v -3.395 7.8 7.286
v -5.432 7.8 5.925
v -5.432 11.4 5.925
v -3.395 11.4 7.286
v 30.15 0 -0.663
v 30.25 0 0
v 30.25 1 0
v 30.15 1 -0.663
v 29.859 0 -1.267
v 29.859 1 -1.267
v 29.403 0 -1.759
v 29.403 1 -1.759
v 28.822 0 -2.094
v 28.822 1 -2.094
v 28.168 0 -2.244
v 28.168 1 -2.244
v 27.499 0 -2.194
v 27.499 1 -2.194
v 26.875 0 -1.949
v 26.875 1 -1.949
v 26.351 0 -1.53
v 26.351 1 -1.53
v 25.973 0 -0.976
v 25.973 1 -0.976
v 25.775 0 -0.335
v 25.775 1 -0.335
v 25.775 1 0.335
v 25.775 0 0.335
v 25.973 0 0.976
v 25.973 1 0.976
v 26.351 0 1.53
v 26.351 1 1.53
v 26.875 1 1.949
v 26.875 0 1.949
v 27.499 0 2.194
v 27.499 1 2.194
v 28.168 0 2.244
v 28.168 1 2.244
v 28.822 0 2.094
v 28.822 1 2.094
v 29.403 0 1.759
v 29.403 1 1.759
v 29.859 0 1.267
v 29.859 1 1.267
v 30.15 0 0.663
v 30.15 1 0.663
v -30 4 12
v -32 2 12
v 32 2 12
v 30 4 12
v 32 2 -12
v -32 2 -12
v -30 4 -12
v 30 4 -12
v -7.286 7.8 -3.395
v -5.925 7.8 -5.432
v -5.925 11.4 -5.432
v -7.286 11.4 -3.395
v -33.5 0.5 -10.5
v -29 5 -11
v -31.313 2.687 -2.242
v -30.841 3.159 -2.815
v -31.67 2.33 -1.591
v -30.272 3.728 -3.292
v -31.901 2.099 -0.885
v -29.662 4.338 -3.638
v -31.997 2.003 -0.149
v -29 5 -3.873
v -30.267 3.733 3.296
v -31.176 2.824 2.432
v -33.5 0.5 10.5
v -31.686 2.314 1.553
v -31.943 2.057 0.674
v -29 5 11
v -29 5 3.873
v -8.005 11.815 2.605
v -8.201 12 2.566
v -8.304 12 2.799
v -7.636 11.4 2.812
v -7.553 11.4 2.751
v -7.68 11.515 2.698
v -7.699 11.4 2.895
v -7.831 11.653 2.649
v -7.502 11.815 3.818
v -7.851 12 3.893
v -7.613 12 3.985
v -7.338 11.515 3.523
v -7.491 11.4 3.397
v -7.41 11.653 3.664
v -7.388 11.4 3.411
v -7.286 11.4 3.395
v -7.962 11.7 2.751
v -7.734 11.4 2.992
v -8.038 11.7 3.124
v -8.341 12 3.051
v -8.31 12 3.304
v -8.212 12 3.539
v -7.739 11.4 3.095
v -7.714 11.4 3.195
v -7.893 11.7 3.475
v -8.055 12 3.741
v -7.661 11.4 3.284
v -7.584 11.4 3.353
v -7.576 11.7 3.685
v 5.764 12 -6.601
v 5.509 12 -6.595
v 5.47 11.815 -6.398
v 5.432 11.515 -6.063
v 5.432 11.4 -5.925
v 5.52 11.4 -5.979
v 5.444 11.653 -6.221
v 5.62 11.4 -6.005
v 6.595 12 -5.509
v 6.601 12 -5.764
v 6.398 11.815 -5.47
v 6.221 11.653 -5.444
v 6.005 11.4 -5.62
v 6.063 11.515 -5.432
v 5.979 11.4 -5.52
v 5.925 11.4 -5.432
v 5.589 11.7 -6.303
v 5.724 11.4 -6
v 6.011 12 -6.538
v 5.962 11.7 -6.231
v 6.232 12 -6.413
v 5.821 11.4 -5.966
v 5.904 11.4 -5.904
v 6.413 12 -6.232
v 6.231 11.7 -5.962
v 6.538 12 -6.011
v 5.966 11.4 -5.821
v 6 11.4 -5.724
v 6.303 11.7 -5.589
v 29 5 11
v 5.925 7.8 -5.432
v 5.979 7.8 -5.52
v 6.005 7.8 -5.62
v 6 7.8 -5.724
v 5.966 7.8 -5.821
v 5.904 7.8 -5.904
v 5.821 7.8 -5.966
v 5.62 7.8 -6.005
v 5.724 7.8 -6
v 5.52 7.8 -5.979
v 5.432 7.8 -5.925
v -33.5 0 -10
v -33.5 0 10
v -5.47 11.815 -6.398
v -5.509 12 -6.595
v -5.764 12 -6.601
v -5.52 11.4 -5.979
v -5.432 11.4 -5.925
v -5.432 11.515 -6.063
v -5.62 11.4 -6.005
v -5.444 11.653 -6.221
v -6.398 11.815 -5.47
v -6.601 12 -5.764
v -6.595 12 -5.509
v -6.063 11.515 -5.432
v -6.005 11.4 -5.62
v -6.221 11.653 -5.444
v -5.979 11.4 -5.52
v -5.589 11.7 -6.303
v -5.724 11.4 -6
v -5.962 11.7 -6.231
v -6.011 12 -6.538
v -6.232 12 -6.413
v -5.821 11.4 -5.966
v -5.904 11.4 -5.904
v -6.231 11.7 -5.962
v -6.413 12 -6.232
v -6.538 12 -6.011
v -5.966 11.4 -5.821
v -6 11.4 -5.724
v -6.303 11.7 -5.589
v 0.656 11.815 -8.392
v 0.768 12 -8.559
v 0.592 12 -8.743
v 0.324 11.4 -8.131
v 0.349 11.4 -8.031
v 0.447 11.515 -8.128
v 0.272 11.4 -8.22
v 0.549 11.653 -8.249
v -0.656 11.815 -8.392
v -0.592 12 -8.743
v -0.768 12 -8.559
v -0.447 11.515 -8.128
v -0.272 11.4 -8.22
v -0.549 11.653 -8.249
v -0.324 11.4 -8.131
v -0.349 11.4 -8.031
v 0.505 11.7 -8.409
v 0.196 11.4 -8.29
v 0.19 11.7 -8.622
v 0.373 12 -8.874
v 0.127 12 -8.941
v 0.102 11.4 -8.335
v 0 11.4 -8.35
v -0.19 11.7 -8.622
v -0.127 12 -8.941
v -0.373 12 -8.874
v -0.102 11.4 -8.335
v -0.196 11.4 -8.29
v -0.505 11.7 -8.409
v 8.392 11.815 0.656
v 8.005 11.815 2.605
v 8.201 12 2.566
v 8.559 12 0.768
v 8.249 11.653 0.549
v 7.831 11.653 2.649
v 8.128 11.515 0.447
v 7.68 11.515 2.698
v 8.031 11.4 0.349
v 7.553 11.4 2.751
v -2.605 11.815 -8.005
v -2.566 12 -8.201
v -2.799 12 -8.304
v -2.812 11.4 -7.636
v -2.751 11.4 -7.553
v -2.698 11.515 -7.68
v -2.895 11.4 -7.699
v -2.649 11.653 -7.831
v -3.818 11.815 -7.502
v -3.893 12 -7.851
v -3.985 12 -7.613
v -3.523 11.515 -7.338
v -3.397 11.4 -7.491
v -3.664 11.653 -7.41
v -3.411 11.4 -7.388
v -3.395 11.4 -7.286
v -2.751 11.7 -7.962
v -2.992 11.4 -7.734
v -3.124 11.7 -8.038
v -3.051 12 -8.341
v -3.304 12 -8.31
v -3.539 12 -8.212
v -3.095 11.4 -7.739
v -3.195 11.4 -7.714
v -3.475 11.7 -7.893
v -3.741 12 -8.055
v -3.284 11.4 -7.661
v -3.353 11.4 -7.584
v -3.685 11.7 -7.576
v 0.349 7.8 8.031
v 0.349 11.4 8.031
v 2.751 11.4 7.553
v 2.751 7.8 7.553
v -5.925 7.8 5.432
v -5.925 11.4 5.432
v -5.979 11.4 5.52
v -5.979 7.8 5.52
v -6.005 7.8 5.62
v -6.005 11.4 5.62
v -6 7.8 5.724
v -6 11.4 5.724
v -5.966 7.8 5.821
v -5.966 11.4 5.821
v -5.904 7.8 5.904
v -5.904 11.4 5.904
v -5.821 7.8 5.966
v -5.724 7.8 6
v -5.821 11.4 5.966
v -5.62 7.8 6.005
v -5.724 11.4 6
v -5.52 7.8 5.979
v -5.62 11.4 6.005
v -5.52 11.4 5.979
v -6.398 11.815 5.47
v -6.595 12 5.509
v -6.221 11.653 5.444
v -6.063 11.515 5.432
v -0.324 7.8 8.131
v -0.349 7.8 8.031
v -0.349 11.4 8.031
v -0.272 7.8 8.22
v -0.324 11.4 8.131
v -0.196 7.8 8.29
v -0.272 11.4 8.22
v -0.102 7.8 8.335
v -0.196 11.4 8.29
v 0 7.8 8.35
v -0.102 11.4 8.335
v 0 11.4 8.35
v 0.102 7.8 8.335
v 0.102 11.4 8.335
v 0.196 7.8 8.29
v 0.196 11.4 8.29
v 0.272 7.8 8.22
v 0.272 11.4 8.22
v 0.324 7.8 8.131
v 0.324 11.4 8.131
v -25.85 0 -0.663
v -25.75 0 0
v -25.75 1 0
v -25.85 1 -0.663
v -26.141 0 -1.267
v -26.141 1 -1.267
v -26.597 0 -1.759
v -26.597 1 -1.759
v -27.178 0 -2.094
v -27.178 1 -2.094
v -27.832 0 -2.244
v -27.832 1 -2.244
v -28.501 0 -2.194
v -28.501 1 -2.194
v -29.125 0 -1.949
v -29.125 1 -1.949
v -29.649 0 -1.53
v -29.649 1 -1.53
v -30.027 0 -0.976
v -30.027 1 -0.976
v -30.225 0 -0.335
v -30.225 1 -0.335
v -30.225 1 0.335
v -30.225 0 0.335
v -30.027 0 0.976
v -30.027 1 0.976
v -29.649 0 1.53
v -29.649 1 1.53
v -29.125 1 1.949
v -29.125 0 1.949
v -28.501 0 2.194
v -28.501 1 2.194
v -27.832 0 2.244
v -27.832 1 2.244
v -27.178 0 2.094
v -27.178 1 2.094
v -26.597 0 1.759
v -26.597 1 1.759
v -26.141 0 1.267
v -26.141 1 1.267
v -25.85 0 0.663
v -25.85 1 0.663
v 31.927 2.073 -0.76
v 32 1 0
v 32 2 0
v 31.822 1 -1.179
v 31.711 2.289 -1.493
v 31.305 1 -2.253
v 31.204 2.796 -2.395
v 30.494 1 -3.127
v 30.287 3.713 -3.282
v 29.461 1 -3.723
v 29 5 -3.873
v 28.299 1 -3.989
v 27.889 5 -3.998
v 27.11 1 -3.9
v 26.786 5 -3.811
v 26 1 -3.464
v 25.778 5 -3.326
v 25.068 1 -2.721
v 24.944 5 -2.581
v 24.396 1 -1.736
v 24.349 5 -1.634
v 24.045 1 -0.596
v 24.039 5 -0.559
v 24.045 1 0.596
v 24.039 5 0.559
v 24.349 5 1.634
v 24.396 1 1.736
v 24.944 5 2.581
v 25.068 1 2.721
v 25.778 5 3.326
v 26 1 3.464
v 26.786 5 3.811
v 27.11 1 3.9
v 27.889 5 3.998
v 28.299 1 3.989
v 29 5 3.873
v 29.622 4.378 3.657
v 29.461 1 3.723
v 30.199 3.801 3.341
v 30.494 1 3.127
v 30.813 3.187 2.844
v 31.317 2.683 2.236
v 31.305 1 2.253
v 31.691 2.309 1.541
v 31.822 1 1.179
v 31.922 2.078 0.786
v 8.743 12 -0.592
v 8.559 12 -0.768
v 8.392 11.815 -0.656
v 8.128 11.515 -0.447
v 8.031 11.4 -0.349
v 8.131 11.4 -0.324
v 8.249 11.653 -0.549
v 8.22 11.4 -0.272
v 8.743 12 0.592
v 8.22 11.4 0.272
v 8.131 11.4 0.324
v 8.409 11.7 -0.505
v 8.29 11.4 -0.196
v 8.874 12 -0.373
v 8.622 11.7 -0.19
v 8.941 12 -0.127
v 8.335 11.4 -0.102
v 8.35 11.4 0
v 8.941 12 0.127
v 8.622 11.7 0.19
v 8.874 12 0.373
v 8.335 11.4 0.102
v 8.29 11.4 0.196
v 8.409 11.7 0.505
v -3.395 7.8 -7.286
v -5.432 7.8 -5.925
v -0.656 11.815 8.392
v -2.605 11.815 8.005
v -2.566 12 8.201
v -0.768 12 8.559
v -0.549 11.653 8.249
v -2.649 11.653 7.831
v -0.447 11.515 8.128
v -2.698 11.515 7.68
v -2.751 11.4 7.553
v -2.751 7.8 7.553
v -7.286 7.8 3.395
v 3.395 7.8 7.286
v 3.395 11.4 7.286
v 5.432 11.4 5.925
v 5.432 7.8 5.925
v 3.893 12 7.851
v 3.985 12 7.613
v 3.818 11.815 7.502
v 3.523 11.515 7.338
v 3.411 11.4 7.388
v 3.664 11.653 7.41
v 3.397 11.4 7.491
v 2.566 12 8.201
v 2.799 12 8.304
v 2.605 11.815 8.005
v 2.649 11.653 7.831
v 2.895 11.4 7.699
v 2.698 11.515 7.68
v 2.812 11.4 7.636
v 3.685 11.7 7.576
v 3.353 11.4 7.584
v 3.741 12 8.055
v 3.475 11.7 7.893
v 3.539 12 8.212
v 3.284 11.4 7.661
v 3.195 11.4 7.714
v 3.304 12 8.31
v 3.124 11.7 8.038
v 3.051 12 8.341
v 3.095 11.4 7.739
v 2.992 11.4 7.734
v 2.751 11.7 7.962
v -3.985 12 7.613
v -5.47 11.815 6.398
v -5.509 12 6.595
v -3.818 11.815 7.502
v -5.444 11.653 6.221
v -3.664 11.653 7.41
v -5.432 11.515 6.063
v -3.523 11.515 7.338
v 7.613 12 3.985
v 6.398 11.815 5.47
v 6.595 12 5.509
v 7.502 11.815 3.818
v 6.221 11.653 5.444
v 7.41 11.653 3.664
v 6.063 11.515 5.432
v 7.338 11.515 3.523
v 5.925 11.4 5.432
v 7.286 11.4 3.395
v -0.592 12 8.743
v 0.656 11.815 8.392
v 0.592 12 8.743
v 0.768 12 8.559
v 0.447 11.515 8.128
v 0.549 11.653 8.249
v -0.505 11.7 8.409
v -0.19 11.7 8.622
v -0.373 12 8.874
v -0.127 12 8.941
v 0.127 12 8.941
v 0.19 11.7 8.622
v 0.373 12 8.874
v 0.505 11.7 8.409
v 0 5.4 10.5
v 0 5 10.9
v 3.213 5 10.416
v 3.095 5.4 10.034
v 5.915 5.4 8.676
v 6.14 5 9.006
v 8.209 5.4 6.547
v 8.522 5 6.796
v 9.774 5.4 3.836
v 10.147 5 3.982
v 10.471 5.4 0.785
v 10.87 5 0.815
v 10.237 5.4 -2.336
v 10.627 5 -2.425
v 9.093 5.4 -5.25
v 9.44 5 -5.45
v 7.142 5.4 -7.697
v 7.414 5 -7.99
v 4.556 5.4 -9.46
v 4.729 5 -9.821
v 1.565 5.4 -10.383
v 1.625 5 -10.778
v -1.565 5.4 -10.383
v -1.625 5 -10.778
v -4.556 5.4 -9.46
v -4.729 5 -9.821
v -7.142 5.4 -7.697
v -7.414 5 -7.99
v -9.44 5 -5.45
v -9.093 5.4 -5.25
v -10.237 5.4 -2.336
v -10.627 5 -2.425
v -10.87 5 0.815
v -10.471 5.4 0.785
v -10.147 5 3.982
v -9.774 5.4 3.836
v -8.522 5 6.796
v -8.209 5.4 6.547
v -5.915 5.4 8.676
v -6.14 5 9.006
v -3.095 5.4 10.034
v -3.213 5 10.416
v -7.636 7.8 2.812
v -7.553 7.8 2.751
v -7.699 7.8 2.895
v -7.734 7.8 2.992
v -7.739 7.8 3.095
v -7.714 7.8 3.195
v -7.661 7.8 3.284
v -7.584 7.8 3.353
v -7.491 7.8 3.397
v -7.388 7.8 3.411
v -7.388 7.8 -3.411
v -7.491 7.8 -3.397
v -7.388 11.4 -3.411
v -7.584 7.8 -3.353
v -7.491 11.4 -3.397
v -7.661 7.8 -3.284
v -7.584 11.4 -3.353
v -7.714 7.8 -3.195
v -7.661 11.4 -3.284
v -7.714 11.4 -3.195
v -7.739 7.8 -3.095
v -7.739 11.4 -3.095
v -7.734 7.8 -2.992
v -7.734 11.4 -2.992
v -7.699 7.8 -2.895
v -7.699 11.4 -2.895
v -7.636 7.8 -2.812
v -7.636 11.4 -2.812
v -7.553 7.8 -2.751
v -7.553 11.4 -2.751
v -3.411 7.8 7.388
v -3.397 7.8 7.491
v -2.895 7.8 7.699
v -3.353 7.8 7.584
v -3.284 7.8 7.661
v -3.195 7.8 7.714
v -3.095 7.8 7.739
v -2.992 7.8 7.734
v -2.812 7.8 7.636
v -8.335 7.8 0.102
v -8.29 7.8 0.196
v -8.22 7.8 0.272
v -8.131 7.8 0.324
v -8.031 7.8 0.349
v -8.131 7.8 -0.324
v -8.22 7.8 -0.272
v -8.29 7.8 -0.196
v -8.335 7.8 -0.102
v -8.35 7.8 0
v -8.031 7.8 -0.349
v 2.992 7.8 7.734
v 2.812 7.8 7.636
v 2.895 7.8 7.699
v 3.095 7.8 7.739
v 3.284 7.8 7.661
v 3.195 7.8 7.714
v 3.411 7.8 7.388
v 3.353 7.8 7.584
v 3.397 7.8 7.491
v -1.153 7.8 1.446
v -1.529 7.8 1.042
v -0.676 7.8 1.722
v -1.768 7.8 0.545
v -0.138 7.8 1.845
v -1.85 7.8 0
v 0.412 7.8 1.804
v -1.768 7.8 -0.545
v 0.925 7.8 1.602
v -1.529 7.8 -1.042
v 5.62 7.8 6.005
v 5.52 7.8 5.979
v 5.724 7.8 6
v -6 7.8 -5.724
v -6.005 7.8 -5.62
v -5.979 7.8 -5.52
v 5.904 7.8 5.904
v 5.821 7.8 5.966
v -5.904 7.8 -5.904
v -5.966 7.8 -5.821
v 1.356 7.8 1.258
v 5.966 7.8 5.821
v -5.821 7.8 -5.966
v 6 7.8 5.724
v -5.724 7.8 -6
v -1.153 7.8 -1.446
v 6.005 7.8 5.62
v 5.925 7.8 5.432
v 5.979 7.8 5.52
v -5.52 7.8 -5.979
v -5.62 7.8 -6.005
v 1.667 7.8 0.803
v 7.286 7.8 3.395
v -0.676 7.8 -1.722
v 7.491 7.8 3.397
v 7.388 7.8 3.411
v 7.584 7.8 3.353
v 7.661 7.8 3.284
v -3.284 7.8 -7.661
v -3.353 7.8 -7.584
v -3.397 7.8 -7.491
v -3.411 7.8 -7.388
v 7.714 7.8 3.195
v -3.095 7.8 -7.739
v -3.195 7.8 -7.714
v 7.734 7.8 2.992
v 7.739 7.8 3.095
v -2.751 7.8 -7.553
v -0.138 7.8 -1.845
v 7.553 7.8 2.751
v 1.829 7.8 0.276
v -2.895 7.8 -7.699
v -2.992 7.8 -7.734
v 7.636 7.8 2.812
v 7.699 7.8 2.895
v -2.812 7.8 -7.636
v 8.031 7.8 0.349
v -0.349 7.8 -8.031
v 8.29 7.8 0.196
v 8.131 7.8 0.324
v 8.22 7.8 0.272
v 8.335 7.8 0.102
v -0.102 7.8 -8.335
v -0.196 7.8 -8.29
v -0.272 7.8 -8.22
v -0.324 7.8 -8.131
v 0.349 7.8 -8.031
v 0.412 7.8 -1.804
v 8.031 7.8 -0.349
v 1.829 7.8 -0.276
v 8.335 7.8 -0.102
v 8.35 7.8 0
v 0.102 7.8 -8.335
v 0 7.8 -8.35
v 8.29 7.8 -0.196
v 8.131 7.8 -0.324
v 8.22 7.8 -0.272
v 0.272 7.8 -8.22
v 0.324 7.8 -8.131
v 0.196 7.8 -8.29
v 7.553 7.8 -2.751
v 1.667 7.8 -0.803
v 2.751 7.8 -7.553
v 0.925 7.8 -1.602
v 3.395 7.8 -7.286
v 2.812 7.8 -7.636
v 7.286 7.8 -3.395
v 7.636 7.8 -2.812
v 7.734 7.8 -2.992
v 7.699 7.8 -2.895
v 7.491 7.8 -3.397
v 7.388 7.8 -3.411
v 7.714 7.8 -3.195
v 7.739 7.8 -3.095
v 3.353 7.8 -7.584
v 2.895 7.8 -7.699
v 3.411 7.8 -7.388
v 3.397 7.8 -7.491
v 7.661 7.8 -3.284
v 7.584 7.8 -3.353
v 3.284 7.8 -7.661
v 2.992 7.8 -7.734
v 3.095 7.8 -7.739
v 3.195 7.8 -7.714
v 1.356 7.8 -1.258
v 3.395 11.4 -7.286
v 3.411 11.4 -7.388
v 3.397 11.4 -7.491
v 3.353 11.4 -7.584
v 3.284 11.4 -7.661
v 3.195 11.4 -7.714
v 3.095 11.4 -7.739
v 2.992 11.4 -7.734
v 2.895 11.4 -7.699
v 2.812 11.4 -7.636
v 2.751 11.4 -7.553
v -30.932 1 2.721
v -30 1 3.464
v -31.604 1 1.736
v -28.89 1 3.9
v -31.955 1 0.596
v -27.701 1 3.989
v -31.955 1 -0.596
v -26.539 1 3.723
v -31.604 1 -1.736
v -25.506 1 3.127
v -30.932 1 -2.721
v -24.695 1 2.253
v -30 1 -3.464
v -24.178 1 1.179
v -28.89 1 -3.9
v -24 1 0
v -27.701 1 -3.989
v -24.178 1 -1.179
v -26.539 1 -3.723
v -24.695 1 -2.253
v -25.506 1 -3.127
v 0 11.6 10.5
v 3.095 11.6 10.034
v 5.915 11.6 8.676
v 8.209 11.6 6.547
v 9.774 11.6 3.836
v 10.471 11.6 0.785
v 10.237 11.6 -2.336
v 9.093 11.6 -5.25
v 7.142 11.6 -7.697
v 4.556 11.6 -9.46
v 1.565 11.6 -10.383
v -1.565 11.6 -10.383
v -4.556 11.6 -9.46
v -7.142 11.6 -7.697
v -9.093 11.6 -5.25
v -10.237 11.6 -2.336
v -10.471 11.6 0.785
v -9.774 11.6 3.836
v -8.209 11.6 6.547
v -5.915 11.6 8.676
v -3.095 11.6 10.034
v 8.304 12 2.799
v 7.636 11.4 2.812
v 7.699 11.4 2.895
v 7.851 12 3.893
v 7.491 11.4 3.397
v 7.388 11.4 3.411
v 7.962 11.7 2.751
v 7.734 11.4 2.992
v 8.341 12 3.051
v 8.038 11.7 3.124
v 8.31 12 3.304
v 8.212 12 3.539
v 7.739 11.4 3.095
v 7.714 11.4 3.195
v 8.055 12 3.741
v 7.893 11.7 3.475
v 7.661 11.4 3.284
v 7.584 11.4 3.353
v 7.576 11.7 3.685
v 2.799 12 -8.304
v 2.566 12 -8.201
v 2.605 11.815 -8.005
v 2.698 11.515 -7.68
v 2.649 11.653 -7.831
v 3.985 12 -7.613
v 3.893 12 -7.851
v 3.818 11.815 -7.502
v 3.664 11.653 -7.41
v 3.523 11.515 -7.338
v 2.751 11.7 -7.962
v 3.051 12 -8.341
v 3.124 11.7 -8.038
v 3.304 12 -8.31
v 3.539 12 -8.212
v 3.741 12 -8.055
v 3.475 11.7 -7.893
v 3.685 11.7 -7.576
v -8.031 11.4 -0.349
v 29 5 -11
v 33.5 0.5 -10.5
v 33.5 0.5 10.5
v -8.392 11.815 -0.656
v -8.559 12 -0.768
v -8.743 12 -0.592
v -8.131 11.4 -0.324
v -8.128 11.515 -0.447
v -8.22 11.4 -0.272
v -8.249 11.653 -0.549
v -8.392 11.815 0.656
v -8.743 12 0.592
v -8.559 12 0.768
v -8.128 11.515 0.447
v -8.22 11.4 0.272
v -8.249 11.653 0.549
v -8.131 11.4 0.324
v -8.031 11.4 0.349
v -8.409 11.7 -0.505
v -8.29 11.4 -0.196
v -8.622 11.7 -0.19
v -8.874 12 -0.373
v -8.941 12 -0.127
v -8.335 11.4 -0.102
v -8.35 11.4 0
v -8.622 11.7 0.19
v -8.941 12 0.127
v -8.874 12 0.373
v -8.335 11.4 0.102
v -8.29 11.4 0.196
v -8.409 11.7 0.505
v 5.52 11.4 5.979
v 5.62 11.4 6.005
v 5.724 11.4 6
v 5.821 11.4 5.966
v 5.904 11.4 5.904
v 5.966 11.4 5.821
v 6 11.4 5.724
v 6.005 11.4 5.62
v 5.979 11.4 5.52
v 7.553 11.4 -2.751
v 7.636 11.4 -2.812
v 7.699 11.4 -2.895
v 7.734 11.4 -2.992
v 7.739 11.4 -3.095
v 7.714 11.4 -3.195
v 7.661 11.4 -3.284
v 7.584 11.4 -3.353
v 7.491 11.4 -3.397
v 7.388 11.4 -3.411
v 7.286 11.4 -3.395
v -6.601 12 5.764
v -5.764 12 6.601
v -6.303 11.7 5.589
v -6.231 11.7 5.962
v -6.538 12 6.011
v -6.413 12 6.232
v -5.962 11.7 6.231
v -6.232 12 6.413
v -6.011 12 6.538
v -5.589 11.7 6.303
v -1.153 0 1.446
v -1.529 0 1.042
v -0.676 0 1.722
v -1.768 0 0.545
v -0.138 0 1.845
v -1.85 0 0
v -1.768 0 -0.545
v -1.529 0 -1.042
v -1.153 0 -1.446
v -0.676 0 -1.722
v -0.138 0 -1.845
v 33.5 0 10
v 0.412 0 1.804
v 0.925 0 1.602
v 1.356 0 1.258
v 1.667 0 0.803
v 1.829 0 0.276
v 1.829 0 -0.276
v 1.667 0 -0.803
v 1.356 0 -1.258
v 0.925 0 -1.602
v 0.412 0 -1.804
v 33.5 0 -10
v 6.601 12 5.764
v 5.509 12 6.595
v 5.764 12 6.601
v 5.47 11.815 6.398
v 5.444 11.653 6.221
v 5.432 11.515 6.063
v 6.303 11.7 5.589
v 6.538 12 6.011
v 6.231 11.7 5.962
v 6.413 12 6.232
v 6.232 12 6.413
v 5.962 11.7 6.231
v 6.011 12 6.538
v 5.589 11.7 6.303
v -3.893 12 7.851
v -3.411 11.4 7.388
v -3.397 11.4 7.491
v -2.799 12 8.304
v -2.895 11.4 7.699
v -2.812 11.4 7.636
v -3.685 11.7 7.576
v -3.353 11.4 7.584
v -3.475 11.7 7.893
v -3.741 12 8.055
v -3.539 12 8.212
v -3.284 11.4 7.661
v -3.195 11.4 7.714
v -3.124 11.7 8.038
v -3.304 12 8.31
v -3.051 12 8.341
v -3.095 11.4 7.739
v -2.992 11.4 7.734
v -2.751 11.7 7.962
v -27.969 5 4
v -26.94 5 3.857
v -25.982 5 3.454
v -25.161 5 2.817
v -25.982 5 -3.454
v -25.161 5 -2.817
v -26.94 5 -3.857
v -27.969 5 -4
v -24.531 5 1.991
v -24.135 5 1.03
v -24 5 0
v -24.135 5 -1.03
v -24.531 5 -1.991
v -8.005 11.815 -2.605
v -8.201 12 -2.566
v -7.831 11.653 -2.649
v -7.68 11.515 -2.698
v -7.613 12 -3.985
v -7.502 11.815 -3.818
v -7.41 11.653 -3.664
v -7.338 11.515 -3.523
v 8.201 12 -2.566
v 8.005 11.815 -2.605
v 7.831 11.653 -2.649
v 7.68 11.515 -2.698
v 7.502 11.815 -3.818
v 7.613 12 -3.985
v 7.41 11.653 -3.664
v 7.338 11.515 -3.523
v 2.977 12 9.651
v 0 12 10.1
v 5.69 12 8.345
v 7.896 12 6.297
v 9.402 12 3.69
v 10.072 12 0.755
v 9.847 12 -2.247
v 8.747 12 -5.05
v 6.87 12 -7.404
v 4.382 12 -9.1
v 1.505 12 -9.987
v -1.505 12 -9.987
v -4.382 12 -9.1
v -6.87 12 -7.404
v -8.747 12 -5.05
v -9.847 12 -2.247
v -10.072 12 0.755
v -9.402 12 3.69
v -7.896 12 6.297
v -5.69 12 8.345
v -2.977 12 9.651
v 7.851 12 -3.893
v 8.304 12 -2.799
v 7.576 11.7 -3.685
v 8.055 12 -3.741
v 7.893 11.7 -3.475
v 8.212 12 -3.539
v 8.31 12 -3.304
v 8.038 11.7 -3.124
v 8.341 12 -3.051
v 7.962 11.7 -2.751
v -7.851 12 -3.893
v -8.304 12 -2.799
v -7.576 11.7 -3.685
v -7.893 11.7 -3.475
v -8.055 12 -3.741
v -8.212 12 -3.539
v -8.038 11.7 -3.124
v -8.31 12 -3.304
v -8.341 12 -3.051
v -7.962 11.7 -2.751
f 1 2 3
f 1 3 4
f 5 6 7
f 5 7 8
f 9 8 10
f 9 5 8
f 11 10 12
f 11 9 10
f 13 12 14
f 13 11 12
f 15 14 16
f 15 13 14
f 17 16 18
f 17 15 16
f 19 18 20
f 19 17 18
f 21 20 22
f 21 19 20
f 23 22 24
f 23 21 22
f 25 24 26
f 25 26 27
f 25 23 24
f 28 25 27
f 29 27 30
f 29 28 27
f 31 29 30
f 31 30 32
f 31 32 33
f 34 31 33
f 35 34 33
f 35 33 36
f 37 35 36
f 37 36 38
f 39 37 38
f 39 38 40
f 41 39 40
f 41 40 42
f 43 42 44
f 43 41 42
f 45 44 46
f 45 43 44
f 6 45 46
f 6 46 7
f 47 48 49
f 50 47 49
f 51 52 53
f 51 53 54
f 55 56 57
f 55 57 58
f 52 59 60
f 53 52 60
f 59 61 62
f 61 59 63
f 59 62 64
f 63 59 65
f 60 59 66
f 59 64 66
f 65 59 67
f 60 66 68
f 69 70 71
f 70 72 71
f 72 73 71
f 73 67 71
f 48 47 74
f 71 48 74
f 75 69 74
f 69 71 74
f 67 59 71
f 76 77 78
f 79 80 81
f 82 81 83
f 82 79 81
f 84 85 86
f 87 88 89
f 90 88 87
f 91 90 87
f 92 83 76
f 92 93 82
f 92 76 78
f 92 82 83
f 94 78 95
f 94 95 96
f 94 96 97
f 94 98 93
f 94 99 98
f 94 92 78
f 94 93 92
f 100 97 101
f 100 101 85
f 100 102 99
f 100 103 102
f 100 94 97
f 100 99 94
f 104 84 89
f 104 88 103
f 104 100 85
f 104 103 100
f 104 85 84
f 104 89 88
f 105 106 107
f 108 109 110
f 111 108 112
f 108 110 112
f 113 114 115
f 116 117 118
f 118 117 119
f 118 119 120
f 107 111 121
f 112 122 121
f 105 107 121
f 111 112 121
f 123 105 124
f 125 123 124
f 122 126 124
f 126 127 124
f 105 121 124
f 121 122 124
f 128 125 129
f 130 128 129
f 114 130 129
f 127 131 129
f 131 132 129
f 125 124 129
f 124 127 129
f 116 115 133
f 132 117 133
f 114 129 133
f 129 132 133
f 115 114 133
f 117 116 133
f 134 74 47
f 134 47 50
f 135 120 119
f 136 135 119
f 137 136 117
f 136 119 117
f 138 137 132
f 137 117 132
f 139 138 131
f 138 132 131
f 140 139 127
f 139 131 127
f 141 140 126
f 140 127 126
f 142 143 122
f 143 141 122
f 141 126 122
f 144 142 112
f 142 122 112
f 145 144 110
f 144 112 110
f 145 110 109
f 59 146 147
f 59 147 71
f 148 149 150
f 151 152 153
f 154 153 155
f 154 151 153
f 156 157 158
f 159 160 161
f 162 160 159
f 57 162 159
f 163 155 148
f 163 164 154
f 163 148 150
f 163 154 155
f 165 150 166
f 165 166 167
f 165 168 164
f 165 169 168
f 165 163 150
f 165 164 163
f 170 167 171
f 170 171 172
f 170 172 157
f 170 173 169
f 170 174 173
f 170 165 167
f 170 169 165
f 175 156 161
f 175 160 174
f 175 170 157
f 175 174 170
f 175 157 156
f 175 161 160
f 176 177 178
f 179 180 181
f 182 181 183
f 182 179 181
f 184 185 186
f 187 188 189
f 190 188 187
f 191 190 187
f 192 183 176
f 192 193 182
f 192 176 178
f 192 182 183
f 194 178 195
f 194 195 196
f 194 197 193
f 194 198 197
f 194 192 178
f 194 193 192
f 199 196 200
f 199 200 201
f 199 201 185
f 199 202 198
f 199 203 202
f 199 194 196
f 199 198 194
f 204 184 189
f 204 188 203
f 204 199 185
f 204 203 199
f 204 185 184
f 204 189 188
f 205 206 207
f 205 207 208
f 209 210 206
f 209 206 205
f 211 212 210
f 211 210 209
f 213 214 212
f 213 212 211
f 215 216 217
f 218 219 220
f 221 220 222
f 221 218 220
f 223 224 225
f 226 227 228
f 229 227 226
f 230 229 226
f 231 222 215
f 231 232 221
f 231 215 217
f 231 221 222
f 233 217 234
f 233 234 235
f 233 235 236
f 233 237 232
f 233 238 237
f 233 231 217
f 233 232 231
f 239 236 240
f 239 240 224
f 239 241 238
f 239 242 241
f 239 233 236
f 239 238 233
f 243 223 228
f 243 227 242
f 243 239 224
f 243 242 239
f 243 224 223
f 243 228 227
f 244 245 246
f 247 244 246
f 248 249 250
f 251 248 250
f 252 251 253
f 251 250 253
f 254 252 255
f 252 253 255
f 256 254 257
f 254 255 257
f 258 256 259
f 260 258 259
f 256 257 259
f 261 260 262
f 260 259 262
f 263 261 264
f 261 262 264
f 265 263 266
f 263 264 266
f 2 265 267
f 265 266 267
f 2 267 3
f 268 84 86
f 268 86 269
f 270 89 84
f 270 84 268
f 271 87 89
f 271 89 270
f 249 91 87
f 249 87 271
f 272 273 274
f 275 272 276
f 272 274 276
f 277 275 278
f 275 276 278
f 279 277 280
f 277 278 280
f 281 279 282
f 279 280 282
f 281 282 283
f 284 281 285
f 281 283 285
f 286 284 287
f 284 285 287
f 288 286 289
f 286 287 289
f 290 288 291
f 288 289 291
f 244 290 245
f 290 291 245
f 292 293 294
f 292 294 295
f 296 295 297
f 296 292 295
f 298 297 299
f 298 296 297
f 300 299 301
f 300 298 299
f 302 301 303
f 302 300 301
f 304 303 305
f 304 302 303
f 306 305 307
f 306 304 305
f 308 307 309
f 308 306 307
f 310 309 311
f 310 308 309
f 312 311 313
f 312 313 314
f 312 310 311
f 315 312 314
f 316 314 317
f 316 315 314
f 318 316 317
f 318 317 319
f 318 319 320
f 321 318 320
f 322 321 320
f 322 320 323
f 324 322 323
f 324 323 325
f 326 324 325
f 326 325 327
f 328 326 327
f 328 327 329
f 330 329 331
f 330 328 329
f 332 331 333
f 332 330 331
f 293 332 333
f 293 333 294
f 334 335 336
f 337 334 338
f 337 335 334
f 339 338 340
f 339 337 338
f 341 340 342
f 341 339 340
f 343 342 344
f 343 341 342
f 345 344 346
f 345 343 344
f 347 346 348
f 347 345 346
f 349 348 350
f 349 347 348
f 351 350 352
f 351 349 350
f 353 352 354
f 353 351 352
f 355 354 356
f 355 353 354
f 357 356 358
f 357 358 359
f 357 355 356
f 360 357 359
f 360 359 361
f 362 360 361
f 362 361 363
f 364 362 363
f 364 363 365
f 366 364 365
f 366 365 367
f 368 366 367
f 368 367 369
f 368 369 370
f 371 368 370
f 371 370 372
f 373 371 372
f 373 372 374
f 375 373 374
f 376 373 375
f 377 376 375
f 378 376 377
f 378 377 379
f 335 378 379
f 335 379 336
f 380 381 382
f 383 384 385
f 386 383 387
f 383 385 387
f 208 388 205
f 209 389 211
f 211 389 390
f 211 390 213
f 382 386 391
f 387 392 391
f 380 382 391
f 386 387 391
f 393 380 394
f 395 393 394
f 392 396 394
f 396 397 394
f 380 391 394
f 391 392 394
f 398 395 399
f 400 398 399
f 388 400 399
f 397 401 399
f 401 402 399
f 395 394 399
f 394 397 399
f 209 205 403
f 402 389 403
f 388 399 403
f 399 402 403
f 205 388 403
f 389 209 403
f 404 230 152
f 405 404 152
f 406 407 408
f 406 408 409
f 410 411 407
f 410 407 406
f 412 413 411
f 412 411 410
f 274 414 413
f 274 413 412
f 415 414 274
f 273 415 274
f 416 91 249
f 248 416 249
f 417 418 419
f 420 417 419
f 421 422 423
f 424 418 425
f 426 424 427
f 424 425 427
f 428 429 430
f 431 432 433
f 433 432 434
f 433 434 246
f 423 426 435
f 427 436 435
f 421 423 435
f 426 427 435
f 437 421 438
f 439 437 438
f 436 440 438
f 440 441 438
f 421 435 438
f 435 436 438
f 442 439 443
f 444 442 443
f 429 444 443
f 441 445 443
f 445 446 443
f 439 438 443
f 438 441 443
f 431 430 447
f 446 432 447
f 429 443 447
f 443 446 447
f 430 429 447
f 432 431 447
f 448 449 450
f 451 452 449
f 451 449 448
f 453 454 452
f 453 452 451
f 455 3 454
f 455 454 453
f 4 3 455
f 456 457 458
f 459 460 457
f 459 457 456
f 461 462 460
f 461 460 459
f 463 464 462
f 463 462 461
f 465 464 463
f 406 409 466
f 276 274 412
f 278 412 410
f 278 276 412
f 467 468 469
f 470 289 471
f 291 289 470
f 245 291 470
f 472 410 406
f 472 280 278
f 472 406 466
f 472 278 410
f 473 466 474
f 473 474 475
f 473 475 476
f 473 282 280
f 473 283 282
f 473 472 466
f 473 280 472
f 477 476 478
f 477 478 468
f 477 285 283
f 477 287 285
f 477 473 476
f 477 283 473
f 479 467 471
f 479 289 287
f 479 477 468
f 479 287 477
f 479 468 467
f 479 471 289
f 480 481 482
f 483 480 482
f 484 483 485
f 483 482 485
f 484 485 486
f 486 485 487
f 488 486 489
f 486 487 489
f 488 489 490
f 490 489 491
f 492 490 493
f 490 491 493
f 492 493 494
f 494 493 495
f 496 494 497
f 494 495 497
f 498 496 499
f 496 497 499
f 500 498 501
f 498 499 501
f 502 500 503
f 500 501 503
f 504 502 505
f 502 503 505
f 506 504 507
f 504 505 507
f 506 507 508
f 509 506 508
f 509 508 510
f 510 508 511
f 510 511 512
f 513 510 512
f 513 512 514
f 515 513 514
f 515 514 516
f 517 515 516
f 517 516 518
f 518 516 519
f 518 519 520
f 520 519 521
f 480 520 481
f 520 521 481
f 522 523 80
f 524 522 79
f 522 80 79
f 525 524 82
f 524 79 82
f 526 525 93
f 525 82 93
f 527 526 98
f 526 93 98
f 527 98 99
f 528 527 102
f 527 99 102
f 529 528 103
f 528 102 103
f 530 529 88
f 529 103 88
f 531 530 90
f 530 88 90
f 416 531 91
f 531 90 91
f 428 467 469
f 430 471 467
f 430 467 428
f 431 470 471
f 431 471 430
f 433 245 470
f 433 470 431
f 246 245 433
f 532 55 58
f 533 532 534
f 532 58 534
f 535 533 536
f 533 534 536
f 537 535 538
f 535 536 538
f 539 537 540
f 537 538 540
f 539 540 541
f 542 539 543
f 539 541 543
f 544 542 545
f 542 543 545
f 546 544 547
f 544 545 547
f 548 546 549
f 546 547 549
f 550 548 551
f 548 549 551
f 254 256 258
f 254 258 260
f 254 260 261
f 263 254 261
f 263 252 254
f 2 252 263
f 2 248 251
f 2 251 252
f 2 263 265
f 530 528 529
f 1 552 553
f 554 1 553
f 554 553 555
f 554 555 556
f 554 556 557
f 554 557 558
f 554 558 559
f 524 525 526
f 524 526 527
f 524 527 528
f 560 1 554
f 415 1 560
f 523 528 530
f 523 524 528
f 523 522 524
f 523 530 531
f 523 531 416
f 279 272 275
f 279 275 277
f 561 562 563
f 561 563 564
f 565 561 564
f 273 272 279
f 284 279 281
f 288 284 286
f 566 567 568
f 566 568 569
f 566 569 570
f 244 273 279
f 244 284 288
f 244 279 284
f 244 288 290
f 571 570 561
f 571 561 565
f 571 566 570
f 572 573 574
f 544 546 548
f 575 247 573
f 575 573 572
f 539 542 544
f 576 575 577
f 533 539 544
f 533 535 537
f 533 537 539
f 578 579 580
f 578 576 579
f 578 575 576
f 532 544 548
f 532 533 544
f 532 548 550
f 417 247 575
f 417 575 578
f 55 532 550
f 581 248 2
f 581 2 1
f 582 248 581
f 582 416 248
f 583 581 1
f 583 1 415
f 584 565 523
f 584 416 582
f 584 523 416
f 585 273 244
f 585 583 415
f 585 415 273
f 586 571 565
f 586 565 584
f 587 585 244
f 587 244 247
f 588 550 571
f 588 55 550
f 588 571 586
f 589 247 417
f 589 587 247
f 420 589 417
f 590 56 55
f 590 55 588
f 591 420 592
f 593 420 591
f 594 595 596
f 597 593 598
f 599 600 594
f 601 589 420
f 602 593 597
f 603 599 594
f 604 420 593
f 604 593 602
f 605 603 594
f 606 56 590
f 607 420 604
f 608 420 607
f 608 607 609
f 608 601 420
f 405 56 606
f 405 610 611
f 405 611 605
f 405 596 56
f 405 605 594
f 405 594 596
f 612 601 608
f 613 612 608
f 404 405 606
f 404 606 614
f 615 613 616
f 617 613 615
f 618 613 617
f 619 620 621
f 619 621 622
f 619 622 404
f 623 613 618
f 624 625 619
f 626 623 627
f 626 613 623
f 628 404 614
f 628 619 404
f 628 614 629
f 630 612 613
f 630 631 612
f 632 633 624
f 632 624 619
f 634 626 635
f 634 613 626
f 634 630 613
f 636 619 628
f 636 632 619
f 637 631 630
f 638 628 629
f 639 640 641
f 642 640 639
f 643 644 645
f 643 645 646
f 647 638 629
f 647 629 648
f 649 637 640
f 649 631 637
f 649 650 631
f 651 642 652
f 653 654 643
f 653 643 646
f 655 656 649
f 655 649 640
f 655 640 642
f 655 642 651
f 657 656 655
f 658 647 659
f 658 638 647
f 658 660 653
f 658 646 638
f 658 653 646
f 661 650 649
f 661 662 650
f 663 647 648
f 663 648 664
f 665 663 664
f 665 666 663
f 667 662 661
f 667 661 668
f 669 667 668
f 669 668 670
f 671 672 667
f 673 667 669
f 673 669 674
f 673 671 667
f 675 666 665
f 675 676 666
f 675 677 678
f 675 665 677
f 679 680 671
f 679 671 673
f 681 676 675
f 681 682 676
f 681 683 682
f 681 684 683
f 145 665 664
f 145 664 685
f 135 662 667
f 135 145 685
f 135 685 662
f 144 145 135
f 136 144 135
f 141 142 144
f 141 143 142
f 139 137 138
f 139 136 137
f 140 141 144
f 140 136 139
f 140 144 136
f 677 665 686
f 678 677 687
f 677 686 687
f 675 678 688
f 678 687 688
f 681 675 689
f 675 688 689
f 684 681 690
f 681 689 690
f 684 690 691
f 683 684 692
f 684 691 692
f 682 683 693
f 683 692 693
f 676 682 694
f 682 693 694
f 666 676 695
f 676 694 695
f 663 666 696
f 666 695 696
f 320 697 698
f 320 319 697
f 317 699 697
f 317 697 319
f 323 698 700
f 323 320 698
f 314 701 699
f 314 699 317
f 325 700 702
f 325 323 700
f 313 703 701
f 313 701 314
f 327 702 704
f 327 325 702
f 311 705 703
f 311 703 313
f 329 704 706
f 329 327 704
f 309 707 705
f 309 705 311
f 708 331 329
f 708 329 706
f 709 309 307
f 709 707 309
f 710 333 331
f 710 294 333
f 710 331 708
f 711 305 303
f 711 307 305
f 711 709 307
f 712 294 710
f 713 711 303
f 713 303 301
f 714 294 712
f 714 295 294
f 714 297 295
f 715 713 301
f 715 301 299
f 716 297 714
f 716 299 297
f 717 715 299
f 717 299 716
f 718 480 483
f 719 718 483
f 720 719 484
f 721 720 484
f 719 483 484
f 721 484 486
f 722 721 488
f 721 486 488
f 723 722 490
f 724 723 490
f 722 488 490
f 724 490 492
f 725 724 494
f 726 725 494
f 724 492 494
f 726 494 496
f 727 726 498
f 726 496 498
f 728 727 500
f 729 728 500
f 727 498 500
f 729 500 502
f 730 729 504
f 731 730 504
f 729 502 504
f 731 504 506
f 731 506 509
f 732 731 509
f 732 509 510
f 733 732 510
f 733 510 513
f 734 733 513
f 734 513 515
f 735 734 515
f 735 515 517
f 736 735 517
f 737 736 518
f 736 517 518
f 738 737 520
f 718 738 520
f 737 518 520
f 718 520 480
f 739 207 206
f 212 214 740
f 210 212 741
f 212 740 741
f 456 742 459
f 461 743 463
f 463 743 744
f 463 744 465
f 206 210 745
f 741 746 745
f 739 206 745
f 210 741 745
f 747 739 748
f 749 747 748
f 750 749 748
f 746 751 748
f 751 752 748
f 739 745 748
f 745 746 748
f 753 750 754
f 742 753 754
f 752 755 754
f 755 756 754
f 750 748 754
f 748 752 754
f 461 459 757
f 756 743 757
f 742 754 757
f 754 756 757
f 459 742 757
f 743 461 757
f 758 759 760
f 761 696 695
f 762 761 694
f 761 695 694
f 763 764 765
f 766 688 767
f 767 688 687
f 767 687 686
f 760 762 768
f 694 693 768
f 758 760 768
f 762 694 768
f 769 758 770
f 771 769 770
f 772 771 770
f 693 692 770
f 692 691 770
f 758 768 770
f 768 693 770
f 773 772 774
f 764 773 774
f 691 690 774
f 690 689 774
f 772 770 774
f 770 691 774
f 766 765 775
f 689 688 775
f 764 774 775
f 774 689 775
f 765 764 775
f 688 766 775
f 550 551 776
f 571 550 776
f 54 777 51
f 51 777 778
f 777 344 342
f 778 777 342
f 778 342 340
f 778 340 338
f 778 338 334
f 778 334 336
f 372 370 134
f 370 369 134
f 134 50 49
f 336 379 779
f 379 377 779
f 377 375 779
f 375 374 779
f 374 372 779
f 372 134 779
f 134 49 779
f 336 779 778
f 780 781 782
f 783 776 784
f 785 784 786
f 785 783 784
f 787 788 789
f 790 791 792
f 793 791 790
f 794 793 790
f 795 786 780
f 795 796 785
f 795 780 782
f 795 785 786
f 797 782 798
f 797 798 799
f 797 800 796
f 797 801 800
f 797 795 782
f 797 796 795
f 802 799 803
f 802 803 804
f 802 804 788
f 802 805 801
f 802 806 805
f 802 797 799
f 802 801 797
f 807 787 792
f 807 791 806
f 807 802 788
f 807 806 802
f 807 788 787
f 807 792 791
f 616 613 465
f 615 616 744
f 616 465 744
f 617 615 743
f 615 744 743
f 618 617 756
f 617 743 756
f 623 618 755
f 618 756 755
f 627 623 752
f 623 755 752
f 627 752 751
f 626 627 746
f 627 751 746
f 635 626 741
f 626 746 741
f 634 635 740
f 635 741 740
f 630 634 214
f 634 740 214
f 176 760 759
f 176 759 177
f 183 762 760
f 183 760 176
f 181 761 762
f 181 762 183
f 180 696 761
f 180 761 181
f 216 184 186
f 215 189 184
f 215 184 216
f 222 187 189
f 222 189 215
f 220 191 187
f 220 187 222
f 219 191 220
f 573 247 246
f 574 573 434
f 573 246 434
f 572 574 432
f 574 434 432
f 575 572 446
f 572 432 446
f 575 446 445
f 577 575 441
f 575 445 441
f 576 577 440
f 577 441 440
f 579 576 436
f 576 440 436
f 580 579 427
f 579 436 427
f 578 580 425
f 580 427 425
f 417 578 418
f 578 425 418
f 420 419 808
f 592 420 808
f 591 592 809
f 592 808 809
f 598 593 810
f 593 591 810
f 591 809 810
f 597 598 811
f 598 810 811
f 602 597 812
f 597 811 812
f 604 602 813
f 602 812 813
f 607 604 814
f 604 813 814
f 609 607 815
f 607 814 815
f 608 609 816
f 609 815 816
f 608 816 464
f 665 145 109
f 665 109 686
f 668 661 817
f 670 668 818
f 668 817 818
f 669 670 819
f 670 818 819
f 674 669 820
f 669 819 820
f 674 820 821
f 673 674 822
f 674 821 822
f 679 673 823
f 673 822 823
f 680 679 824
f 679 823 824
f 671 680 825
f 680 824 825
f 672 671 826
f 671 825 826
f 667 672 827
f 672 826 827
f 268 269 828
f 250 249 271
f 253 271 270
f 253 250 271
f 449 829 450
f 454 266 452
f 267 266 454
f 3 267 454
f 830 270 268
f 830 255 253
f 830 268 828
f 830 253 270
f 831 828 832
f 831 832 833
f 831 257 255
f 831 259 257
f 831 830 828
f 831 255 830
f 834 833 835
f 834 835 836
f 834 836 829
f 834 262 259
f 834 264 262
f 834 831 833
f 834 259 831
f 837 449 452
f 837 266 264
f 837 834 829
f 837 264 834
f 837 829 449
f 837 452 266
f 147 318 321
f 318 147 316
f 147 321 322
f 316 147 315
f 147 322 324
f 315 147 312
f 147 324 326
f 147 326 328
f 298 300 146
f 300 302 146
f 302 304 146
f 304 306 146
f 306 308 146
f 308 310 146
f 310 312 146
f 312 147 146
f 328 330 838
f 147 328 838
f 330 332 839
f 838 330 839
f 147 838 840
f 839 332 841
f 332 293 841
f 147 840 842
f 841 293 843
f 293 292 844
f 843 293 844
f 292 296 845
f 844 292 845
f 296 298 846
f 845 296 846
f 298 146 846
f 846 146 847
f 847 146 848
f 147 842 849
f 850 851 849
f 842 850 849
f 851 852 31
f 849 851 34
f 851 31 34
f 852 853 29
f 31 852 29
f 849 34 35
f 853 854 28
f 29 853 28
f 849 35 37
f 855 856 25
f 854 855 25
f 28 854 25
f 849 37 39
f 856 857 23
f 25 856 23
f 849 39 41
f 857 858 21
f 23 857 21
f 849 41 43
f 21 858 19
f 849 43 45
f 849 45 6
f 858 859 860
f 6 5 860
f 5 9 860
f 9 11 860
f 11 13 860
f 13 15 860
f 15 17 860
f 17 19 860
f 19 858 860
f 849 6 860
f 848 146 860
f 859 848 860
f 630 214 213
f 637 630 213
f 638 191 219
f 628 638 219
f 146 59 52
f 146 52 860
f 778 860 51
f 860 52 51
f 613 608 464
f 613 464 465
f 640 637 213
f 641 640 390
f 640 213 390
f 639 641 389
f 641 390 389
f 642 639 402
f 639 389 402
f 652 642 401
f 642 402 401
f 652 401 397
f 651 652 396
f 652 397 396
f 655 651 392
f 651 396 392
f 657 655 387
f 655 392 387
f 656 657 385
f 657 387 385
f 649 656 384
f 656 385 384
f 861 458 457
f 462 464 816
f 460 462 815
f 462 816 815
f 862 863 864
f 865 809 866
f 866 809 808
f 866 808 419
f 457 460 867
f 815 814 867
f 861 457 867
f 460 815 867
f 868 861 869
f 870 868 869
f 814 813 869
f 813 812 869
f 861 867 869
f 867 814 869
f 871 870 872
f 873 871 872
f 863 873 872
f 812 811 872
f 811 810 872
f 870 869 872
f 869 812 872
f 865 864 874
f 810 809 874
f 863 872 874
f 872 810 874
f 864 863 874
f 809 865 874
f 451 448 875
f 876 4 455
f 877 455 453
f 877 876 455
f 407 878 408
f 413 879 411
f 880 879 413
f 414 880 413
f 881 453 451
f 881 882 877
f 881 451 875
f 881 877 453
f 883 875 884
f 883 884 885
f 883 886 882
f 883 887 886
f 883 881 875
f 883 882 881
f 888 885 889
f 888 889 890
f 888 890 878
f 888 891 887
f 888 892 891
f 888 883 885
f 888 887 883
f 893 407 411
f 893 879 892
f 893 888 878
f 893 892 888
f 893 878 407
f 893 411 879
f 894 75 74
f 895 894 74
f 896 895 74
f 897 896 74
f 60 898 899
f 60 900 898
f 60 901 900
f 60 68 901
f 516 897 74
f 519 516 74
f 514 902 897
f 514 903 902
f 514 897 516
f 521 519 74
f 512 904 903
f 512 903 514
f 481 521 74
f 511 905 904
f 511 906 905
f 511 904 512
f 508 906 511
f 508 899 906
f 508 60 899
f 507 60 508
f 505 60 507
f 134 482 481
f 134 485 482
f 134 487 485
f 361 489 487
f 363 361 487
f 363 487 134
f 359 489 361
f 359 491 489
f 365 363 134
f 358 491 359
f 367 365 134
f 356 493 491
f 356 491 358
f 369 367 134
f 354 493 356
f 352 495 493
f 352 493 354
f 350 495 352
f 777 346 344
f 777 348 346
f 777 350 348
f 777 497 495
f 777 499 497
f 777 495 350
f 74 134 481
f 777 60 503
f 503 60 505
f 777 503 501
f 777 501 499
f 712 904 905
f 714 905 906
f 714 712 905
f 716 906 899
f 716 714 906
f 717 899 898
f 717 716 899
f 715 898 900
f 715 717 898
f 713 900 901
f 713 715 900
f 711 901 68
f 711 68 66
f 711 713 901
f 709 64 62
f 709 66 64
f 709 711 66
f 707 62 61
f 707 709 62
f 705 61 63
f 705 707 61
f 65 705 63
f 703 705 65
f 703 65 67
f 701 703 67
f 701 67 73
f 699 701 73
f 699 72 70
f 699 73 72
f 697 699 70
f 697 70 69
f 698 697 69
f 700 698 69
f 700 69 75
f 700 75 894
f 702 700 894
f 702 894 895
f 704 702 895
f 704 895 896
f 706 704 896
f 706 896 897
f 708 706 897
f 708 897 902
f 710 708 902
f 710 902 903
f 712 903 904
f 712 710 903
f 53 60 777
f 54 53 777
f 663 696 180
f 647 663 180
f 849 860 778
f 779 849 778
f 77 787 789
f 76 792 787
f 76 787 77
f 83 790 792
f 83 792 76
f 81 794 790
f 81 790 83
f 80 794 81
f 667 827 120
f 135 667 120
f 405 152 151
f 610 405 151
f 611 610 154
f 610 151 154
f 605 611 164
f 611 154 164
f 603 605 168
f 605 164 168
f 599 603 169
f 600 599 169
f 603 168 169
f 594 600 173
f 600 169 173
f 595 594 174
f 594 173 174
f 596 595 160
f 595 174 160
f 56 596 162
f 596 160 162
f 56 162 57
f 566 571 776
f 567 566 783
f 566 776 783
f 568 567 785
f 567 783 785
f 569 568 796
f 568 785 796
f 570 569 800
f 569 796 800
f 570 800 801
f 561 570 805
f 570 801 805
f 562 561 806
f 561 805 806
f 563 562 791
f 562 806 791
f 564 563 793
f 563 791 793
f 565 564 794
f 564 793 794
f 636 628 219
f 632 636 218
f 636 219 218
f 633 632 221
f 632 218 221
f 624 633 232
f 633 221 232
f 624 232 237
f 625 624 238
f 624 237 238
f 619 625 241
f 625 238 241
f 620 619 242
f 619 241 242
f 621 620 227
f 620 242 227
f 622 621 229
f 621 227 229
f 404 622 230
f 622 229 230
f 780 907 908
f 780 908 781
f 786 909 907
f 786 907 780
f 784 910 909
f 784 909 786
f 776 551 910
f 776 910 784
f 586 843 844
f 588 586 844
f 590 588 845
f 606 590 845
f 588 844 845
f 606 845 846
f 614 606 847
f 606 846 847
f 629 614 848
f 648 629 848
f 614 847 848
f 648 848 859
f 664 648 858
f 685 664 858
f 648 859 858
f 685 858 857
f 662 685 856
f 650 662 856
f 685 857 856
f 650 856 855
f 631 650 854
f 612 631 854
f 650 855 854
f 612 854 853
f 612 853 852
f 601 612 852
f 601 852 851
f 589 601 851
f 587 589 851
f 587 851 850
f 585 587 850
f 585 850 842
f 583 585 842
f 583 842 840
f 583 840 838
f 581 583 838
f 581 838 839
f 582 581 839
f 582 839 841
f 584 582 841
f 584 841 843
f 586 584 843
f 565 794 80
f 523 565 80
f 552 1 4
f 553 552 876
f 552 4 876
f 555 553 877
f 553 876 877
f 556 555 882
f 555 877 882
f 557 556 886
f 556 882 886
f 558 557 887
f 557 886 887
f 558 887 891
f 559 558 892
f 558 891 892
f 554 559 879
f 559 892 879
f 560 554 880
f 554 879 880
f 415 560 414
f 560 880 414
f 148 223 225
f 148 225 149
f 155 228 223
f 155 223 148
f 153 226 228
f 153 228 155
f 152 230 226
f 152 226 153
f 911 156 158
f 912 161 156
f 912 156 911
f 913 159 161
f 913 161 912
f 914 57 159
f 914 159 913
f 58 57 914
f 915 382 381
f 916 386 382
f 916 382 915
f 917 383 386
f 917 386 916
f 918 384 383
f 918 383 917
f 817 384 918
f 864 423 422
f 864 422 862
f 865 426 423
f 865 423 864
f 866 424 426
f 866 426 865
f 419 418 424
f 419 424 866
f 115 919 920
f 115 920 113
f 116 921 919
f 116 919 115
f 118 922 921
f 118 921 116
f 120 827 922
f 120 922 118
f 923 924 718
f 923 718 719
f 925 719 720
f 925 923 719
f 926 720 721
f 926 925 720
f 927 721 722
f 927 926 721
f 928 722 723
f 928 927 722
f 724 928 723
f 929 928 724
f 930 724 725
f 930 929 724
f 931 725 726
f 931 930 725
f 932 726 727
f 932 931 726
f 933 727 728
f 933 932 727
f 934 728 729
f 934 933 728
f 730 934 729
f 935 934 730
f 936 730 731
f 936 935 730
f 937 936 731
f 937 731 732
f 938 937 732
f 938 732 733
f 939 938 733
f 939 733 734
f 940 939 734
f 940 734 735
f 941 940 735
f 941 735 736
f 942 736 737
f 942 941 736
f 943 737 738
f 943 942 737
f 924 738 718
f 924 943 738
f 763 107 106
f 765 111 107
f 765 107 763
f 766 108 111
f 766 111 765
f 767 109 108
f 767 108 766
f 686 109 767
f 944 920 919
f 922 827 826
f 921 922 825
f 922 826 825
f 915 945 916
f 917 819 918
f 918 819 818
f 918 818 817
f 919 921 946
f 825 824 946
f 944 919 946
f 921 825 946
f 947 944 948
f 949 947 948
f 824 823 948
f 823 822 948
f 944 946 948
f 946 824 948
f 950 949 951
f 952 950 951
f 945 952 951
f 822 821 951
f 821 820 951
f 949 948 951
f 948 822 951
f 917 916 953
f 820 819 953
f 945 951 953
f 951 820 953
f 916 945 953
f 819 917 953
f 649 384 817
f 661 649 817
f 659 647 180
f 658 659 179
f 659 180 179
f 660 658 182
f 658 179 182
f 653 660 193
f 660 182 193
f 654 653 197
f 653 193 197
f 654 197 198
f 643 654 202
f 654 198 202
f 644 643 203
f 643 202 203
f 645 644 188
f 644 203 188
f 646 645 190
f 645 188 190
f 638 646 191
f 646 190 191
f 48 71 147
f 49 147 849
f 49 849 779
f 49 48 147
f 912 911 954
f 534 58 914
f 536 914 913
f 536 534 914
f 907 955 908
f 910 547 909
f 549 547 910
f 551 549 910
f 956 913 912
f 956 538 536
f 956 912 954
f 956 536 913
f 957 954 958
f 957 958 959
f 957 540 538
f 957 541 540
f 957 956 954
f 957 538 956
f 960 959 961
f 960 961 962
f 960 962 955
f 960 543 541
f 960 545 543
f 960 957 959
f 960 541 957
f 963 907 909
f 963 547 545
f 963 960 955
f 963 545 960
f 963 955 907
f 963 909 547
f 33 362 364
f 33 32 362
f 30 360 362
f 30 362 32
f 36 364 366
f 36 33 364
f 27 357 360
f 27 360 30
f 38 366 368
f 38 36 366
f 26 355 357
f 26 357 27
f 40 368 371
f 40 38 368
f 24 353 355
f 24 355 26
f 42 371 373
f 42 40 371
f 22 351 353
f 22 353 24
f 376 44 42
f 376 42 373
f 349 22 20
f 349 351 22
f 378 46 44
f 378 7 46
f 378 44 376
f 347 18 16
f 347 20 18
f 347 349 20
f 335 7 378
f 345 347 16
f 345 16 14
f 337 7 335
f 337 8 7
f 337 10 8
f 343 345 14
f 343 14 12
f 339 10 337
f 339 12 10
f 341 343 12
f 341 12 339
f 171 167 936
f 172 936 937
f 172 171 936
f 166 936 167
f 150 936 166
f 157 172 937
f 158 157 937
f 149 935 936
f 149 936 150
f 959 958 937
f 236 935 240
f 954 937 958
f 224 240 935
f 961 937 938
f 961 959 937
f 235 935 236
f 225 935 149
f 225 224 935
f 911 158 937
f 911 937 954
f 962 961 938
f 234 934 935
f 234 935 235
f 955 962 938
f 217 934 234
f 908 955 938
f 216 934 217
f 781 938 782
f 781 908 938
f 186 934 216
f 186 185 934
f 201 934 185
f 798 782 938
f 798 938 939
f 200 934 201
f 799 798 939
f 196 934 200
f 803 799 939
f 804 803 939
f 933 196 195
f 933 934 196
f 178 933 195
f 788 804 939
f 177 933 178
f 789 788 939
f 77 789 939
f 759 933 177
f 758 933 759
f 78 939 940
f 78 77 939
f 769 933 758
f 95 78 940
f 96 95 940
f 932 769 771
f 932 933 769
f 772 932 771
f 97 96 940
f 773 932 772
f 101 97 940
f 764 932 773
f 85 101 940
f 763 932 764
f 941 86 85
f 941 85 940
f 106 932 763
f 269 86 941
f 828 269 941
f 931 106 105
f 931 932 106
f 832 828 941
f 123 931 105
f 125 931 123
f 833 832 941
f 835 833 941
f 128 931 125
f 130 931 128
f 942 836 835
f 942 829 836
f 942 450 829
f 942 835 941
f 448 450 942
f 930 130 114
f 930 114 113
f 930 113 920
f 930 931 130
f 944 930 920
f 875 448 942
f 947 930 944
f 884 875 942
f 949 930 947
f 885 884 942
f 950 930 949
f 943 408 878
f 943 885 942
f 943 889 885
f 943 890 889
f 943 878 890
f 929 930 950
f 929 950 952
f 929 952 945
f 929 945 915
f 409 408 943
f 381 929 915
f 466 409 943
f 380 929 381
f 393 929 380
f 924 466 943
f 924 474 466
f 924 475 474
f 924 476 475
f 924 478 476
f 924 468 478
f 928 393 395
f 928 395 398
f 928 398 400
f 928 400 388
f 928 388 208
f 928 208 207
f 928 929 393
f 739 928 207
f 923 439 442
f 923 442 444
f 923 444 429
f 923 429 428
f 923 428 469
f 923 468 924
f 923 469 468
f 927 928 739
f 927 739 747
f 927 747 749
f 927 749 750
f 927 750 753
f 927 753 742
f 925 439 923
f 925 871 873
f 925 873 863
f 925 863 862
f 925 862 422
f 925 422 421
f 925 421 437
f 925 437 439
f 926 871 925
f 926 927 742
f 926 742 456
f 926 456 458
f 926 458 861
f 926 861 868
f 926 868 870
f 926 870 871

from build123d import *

# Parameters (mm, degrees)
SKETCH1_W                      = 67
SKETCH1_H                      = 24
BOSS_EXTRUDE1_DEPTH            = 5
SKETCH2_R                      = 10.5
BOSS_EXTRUDE2_DEPTH            = 7
CBORE_START                    = 1
CBORE_FOR_M4_SHCS1_OUTLINE_R   = 4
CBORE_FOR_M4_SHCS1_DEPTH       = 4
CBORE_FOR_M4_SHCS1_2_OUTLINE_R = 2.25
CBORE_FOR_M4_SHCS1_2_DEPTH     = 1
CHAMFER1_SIZE                  = 1
CHAMFER2_SIZE                  = 2
SKETCH5_OUTSIDE_W              = 83.434
SKETCH5_OUTSIDE_H              = 28.434
CUT_EXTRUDE1_DEPTH             = 43.921439864
SKETCH6_R                      = 10.5
BOSS_EXTRUDE3_DEPTH            = 7
CHAMFER4_SIZE                  = 0.4
HOLE1_D                        = 3.7
HOLE1_DEPTH                    = 16
HOLE1_TIP                      = 1.85
CUT_EXTRUDE2_DEPTH             = 4.2
SKETCH12_R                     = 0.35
CUT_EXTRUDE3_DEPTH             = 4.2
CHAMFER5_SIZE                  = 0.6


# Read off the part's stored shape, not the designer's step: CBORE for M4 SHCS1
with BuildPart() as part:
    # Sketch1 → Boss-Extrude1 (new body)
    with BuildSketch(Plane(origin=(0, 0, 0), x_dir=(1, 0, 0), z_dir=(0, 1, 0))):
        Rectangle(SKETCH1_W, SKETCH1_H)
    extrude(amount=BOSS_EXTRUDE1_DEPTH)

    # Sketch2 → Boss-Extrude2 (add)
    with BuildSketch(Plane(origin=(0, 5, 0), x_dir=(1, 0, 0), z_dir=(0, 1, 0))):
        with Locations(Location((0, 0, 0), (0, 0, 270))):
            Circle(SKETCH2_R)
    extrude(amount=BOSS_EXTRUDE2_DEPTH)

    # CBORE for M4 SHCS1 outline → CBORE for M4 SHCS1 (cut)
    with BuildSketch(Plane(origin=(0, 0, 0), x_dir=(1, 0, 0), z_dir=(0, 1, 0)).offset(CBORE_START)):
        with Locations((28, 0)):
            Circle(CBORE_FOR_M4_SHCS1_OUTLINE_R)
        with Locations((-28, 0)):
            Circle(CBORE_FOR_M4_SHCS1_OUTLINE_R)
    extrude(amount=CBORE_FOR_M4_SHCS1_DEPTH, mode=Mode.SUBTRACT)

    # CBORE for M4 SHCS1 2 outline → CBORE for M4 SHCS1 2 (cut)
    with BuildSketch(Plane(origin=(0, 0, 0), x_dir=(1, 0, 0), z_dir=(0, 1, 0))):
        with Locations((28, 0)):
            Circle(CBORE_FOR_M4_SHCS1_2_OUTLINE_R)
        with Locations((-28, 0)):
            Circle(CBORE_FOR_M4_SHCS1_2_OUTLINE_R)
    extrude(amount=CBORE_FOR_M4_SHCS1_2_DEPTH, mode=Mode.SUBTRACT)

    # Chamfer1
    chamfer1_edges = [part.edges().sort_by_distance(p)[0] for p in [
        (-33.5, 5, 0),
        (0, 5, 12),
        (33.5, 5, 0),
        (33.5, 2.5, 12),
        (-33.5, 2.5, 12),
        (-33.5, 2.5, -12),
        (33.5, 2.5, -12),
        (0, 5, -12),
    ]]
    chamfer(chamfer1_edges, length=CHAMFER1_SIZE)

    # Chamfer2
    chamfer2_edges = [part.edges().sort_by_distance(p)[0] for p in [
        (0, 0, -12),
        (0, 0, 12),
    ]]
    chamfer(chamfer2_edges, length=CHAMFER2_SIZE)

    # Sketch5 outside → Cut-Extrude1 (cut, through all)
    with BuildSketch(Plane.XY.offset(12)):
        with Locations((0, 6)):
            Rectangle(SKETCH5_OUTSIDE_W, SKETCH5_OUTSIDE_H)
        Polygon((-34, 0), (-22, 12), (22, 12), (34, 0), align=None, mode=Mode.SUBTRACT)
    extrude(amount=-CUT_EXTRUDE1_DEPTH, mode=Mode.SUBTRACT)

    # Sketch6 → Boss-Extrude3 (add)
    with BuildSketch(Plane(origin=(0, 5, 0), x_dir=(1, 0, 0), z_dir=(0, 1, 0))):
        with Locations(Location((0, 0, 0), (0, 0, 270))):
            Circle(SKETCH6_R)
    extrude(amount=BOSS_EXTRUDE3_DEPTH)

    # Chamfer4
    chamfer4_edges = [part.edges().sort_by_distance(p)[0] for p in [
        (0, 5, -10.5),
        (0, 12, -10.5),
    ]]
    chamfer(chamfer4_edges, length=CHAMFER4_SIZE)

    # Hole1
    with Locations(Plane(origin=(0, 12, 0), x_dir=(1, 0, 0), z_dir=(0, 1, 0))):
        with Locations((0, 0)):
            Hole(HOLE1_D / 2, depth=HOLE1_DEPTH)
            with Locations((0, 0, -(HOLE1_DEPTH + HOLE1_TIP / 2))):  # 90° drill point
                Cone(0, HOLE1_D / 2, HOLE1_TIP, mode=Mode.SUBTRACT)

    # Sketch11 → Cut-Extrude2 (cut)
    with BuildSketch(Plane(origin=(0, 12, 0), x_dir=(1, 0, 0), z_dir=(0, 1, 0))):
        Polygon((0, 8.1), (-3.099735802, 7.483424213), (-5.727564928, 5.727564928), (-7.483424213, 3.099735802), (-8.1, 0), (-7.483424213, -3.099735802), (-5.727564928, -5.727564928), (-3.099735802, -7.483424213), (0, -8.1), (3.099735802, -7.483424213), (5.727564928, -5.727564928), (7.483424213, -3.099735802), (8.1, 0), (7.483424213, 3.099735802), (5.727564928, 5.727564928), (3.099735802, 7.483424213), align=None)
    extrude(amount=-CUT_EXTRUDE2_DEPTH, mode=Mode.SUBTRACT)

    # Sketch12 → Cut-Extrude3 (cut)
    with BuildSketch(Plane(origin=(0, 12, 0), x_dir=(1, 0, 0), z_dir=(0, 1, 0))):
        with Locations((0, 8)):
            Circle(SKETCH12_R)
        with Locations((3.061467459, 7.39103626)):
            Circle(SKETCH12_R)
        with Locations((5.656854249, 5.656854249)):
            Circle(SKETCH12_R)
        with Locations((7.39103626, 3.061467459)):
            Circle(SKETCH12_R)
        with Locations((8, 0)):
            Circle(SKETCH12_R)
        with Locations((7.39103626, -3.061467459)):
            Circle(SKETCH12_R)
        with Locations((5.656854249, -5.656854249)):
            Circle(SKETCH12_R)
        with Locations((3.061467459, -7.39103626)):
            Circle(SKETCH12_R)
        with Locations((0, -8)):
            Circle(SKETCH12_R)
        with Locations((-3.061467459, -7.39103626)):
            Circle(SKETCH12_R)
        with Locations((-5.656854249, -5.656854249)):
            Circle(SKETCH12_R)
        with Locations((-7.39103626, -3.061467459)):
            Circle(SKETCH12_R)
        with Locations((-8, 0)):
            Circle(SKETCH12_R)
        with Locations((-7.39103626, 3.061467459)):
            Circle(SKETCH12_R)
        with Locations((-5.656854249, 5.656854249)):
            Circle(SKETCH12_R)
        with Locations((-3.061467459, 7.39103626)):
            Circle(SKETCH12_R)
    extrude(amount=-CUT_EXTRUDE3_DEPTH, mode=Mode.SUBTRACT)

    # Chamfer5
    chamfer5_edges = [part.edges().sort_by_distance(p)[0] for p in [
        (-1.549867901, 12, -7.791712107),
        (-4.413650365, 12, -6.60549457),
        (-6.60549457, 12, -4.413650365),
        (-7.791712107, 12, -1.549867901),
        (-7.791712107, 12, 1.549867901),
        (-6.60549457, 12, 4.413650365),
        (-4.413650365, 12, 6.60549457),
        (-1.549867901, 12, 7.791712107),
        (1.549867901, 12, 7.791712107),
        (4.413650365, 12, 6.60549457),
        (6.60549457, 12, 4.413650365),
        (7.791712107, 12, 1.549867901),
        (7.791712107, 12, -1.549867901),
        (6.60549457, 12, -4.413650365),
        (4.413650365, 12, -6.60549457),
        (1.549867901, 12, -7.791712107),
        (-3.19540666, 12, -7.714394096),
        (-5.904341623, 12, -5.904341623),
        (-7.714394096, 12, -3.19540666),
        (-8.35, 12, 0),
        (-7.714394096, 12, 3.19540666),
        (-5.904341623, 12, 5.904341623),
        (-3.19540666, 12, 7.714394096),
        (0, 12, 8.35),
        (3.19540666, 12, 7.714394096),
        (5.904341623, 12, 5.904341623),
        (7.714394096, 12, 3.19540666),
        (8.35, 12, 0),
        (7.714394096, 12, -3.19540666),
        (5.904341623, 12, -5.904341623),
        (3.19540666, 12, -7.714394096),
        (0, 12, -8.35),
    ]]
    chamfer(chamfer5_edges, length=CHAMFER5_SIZE)


solid = part.part
